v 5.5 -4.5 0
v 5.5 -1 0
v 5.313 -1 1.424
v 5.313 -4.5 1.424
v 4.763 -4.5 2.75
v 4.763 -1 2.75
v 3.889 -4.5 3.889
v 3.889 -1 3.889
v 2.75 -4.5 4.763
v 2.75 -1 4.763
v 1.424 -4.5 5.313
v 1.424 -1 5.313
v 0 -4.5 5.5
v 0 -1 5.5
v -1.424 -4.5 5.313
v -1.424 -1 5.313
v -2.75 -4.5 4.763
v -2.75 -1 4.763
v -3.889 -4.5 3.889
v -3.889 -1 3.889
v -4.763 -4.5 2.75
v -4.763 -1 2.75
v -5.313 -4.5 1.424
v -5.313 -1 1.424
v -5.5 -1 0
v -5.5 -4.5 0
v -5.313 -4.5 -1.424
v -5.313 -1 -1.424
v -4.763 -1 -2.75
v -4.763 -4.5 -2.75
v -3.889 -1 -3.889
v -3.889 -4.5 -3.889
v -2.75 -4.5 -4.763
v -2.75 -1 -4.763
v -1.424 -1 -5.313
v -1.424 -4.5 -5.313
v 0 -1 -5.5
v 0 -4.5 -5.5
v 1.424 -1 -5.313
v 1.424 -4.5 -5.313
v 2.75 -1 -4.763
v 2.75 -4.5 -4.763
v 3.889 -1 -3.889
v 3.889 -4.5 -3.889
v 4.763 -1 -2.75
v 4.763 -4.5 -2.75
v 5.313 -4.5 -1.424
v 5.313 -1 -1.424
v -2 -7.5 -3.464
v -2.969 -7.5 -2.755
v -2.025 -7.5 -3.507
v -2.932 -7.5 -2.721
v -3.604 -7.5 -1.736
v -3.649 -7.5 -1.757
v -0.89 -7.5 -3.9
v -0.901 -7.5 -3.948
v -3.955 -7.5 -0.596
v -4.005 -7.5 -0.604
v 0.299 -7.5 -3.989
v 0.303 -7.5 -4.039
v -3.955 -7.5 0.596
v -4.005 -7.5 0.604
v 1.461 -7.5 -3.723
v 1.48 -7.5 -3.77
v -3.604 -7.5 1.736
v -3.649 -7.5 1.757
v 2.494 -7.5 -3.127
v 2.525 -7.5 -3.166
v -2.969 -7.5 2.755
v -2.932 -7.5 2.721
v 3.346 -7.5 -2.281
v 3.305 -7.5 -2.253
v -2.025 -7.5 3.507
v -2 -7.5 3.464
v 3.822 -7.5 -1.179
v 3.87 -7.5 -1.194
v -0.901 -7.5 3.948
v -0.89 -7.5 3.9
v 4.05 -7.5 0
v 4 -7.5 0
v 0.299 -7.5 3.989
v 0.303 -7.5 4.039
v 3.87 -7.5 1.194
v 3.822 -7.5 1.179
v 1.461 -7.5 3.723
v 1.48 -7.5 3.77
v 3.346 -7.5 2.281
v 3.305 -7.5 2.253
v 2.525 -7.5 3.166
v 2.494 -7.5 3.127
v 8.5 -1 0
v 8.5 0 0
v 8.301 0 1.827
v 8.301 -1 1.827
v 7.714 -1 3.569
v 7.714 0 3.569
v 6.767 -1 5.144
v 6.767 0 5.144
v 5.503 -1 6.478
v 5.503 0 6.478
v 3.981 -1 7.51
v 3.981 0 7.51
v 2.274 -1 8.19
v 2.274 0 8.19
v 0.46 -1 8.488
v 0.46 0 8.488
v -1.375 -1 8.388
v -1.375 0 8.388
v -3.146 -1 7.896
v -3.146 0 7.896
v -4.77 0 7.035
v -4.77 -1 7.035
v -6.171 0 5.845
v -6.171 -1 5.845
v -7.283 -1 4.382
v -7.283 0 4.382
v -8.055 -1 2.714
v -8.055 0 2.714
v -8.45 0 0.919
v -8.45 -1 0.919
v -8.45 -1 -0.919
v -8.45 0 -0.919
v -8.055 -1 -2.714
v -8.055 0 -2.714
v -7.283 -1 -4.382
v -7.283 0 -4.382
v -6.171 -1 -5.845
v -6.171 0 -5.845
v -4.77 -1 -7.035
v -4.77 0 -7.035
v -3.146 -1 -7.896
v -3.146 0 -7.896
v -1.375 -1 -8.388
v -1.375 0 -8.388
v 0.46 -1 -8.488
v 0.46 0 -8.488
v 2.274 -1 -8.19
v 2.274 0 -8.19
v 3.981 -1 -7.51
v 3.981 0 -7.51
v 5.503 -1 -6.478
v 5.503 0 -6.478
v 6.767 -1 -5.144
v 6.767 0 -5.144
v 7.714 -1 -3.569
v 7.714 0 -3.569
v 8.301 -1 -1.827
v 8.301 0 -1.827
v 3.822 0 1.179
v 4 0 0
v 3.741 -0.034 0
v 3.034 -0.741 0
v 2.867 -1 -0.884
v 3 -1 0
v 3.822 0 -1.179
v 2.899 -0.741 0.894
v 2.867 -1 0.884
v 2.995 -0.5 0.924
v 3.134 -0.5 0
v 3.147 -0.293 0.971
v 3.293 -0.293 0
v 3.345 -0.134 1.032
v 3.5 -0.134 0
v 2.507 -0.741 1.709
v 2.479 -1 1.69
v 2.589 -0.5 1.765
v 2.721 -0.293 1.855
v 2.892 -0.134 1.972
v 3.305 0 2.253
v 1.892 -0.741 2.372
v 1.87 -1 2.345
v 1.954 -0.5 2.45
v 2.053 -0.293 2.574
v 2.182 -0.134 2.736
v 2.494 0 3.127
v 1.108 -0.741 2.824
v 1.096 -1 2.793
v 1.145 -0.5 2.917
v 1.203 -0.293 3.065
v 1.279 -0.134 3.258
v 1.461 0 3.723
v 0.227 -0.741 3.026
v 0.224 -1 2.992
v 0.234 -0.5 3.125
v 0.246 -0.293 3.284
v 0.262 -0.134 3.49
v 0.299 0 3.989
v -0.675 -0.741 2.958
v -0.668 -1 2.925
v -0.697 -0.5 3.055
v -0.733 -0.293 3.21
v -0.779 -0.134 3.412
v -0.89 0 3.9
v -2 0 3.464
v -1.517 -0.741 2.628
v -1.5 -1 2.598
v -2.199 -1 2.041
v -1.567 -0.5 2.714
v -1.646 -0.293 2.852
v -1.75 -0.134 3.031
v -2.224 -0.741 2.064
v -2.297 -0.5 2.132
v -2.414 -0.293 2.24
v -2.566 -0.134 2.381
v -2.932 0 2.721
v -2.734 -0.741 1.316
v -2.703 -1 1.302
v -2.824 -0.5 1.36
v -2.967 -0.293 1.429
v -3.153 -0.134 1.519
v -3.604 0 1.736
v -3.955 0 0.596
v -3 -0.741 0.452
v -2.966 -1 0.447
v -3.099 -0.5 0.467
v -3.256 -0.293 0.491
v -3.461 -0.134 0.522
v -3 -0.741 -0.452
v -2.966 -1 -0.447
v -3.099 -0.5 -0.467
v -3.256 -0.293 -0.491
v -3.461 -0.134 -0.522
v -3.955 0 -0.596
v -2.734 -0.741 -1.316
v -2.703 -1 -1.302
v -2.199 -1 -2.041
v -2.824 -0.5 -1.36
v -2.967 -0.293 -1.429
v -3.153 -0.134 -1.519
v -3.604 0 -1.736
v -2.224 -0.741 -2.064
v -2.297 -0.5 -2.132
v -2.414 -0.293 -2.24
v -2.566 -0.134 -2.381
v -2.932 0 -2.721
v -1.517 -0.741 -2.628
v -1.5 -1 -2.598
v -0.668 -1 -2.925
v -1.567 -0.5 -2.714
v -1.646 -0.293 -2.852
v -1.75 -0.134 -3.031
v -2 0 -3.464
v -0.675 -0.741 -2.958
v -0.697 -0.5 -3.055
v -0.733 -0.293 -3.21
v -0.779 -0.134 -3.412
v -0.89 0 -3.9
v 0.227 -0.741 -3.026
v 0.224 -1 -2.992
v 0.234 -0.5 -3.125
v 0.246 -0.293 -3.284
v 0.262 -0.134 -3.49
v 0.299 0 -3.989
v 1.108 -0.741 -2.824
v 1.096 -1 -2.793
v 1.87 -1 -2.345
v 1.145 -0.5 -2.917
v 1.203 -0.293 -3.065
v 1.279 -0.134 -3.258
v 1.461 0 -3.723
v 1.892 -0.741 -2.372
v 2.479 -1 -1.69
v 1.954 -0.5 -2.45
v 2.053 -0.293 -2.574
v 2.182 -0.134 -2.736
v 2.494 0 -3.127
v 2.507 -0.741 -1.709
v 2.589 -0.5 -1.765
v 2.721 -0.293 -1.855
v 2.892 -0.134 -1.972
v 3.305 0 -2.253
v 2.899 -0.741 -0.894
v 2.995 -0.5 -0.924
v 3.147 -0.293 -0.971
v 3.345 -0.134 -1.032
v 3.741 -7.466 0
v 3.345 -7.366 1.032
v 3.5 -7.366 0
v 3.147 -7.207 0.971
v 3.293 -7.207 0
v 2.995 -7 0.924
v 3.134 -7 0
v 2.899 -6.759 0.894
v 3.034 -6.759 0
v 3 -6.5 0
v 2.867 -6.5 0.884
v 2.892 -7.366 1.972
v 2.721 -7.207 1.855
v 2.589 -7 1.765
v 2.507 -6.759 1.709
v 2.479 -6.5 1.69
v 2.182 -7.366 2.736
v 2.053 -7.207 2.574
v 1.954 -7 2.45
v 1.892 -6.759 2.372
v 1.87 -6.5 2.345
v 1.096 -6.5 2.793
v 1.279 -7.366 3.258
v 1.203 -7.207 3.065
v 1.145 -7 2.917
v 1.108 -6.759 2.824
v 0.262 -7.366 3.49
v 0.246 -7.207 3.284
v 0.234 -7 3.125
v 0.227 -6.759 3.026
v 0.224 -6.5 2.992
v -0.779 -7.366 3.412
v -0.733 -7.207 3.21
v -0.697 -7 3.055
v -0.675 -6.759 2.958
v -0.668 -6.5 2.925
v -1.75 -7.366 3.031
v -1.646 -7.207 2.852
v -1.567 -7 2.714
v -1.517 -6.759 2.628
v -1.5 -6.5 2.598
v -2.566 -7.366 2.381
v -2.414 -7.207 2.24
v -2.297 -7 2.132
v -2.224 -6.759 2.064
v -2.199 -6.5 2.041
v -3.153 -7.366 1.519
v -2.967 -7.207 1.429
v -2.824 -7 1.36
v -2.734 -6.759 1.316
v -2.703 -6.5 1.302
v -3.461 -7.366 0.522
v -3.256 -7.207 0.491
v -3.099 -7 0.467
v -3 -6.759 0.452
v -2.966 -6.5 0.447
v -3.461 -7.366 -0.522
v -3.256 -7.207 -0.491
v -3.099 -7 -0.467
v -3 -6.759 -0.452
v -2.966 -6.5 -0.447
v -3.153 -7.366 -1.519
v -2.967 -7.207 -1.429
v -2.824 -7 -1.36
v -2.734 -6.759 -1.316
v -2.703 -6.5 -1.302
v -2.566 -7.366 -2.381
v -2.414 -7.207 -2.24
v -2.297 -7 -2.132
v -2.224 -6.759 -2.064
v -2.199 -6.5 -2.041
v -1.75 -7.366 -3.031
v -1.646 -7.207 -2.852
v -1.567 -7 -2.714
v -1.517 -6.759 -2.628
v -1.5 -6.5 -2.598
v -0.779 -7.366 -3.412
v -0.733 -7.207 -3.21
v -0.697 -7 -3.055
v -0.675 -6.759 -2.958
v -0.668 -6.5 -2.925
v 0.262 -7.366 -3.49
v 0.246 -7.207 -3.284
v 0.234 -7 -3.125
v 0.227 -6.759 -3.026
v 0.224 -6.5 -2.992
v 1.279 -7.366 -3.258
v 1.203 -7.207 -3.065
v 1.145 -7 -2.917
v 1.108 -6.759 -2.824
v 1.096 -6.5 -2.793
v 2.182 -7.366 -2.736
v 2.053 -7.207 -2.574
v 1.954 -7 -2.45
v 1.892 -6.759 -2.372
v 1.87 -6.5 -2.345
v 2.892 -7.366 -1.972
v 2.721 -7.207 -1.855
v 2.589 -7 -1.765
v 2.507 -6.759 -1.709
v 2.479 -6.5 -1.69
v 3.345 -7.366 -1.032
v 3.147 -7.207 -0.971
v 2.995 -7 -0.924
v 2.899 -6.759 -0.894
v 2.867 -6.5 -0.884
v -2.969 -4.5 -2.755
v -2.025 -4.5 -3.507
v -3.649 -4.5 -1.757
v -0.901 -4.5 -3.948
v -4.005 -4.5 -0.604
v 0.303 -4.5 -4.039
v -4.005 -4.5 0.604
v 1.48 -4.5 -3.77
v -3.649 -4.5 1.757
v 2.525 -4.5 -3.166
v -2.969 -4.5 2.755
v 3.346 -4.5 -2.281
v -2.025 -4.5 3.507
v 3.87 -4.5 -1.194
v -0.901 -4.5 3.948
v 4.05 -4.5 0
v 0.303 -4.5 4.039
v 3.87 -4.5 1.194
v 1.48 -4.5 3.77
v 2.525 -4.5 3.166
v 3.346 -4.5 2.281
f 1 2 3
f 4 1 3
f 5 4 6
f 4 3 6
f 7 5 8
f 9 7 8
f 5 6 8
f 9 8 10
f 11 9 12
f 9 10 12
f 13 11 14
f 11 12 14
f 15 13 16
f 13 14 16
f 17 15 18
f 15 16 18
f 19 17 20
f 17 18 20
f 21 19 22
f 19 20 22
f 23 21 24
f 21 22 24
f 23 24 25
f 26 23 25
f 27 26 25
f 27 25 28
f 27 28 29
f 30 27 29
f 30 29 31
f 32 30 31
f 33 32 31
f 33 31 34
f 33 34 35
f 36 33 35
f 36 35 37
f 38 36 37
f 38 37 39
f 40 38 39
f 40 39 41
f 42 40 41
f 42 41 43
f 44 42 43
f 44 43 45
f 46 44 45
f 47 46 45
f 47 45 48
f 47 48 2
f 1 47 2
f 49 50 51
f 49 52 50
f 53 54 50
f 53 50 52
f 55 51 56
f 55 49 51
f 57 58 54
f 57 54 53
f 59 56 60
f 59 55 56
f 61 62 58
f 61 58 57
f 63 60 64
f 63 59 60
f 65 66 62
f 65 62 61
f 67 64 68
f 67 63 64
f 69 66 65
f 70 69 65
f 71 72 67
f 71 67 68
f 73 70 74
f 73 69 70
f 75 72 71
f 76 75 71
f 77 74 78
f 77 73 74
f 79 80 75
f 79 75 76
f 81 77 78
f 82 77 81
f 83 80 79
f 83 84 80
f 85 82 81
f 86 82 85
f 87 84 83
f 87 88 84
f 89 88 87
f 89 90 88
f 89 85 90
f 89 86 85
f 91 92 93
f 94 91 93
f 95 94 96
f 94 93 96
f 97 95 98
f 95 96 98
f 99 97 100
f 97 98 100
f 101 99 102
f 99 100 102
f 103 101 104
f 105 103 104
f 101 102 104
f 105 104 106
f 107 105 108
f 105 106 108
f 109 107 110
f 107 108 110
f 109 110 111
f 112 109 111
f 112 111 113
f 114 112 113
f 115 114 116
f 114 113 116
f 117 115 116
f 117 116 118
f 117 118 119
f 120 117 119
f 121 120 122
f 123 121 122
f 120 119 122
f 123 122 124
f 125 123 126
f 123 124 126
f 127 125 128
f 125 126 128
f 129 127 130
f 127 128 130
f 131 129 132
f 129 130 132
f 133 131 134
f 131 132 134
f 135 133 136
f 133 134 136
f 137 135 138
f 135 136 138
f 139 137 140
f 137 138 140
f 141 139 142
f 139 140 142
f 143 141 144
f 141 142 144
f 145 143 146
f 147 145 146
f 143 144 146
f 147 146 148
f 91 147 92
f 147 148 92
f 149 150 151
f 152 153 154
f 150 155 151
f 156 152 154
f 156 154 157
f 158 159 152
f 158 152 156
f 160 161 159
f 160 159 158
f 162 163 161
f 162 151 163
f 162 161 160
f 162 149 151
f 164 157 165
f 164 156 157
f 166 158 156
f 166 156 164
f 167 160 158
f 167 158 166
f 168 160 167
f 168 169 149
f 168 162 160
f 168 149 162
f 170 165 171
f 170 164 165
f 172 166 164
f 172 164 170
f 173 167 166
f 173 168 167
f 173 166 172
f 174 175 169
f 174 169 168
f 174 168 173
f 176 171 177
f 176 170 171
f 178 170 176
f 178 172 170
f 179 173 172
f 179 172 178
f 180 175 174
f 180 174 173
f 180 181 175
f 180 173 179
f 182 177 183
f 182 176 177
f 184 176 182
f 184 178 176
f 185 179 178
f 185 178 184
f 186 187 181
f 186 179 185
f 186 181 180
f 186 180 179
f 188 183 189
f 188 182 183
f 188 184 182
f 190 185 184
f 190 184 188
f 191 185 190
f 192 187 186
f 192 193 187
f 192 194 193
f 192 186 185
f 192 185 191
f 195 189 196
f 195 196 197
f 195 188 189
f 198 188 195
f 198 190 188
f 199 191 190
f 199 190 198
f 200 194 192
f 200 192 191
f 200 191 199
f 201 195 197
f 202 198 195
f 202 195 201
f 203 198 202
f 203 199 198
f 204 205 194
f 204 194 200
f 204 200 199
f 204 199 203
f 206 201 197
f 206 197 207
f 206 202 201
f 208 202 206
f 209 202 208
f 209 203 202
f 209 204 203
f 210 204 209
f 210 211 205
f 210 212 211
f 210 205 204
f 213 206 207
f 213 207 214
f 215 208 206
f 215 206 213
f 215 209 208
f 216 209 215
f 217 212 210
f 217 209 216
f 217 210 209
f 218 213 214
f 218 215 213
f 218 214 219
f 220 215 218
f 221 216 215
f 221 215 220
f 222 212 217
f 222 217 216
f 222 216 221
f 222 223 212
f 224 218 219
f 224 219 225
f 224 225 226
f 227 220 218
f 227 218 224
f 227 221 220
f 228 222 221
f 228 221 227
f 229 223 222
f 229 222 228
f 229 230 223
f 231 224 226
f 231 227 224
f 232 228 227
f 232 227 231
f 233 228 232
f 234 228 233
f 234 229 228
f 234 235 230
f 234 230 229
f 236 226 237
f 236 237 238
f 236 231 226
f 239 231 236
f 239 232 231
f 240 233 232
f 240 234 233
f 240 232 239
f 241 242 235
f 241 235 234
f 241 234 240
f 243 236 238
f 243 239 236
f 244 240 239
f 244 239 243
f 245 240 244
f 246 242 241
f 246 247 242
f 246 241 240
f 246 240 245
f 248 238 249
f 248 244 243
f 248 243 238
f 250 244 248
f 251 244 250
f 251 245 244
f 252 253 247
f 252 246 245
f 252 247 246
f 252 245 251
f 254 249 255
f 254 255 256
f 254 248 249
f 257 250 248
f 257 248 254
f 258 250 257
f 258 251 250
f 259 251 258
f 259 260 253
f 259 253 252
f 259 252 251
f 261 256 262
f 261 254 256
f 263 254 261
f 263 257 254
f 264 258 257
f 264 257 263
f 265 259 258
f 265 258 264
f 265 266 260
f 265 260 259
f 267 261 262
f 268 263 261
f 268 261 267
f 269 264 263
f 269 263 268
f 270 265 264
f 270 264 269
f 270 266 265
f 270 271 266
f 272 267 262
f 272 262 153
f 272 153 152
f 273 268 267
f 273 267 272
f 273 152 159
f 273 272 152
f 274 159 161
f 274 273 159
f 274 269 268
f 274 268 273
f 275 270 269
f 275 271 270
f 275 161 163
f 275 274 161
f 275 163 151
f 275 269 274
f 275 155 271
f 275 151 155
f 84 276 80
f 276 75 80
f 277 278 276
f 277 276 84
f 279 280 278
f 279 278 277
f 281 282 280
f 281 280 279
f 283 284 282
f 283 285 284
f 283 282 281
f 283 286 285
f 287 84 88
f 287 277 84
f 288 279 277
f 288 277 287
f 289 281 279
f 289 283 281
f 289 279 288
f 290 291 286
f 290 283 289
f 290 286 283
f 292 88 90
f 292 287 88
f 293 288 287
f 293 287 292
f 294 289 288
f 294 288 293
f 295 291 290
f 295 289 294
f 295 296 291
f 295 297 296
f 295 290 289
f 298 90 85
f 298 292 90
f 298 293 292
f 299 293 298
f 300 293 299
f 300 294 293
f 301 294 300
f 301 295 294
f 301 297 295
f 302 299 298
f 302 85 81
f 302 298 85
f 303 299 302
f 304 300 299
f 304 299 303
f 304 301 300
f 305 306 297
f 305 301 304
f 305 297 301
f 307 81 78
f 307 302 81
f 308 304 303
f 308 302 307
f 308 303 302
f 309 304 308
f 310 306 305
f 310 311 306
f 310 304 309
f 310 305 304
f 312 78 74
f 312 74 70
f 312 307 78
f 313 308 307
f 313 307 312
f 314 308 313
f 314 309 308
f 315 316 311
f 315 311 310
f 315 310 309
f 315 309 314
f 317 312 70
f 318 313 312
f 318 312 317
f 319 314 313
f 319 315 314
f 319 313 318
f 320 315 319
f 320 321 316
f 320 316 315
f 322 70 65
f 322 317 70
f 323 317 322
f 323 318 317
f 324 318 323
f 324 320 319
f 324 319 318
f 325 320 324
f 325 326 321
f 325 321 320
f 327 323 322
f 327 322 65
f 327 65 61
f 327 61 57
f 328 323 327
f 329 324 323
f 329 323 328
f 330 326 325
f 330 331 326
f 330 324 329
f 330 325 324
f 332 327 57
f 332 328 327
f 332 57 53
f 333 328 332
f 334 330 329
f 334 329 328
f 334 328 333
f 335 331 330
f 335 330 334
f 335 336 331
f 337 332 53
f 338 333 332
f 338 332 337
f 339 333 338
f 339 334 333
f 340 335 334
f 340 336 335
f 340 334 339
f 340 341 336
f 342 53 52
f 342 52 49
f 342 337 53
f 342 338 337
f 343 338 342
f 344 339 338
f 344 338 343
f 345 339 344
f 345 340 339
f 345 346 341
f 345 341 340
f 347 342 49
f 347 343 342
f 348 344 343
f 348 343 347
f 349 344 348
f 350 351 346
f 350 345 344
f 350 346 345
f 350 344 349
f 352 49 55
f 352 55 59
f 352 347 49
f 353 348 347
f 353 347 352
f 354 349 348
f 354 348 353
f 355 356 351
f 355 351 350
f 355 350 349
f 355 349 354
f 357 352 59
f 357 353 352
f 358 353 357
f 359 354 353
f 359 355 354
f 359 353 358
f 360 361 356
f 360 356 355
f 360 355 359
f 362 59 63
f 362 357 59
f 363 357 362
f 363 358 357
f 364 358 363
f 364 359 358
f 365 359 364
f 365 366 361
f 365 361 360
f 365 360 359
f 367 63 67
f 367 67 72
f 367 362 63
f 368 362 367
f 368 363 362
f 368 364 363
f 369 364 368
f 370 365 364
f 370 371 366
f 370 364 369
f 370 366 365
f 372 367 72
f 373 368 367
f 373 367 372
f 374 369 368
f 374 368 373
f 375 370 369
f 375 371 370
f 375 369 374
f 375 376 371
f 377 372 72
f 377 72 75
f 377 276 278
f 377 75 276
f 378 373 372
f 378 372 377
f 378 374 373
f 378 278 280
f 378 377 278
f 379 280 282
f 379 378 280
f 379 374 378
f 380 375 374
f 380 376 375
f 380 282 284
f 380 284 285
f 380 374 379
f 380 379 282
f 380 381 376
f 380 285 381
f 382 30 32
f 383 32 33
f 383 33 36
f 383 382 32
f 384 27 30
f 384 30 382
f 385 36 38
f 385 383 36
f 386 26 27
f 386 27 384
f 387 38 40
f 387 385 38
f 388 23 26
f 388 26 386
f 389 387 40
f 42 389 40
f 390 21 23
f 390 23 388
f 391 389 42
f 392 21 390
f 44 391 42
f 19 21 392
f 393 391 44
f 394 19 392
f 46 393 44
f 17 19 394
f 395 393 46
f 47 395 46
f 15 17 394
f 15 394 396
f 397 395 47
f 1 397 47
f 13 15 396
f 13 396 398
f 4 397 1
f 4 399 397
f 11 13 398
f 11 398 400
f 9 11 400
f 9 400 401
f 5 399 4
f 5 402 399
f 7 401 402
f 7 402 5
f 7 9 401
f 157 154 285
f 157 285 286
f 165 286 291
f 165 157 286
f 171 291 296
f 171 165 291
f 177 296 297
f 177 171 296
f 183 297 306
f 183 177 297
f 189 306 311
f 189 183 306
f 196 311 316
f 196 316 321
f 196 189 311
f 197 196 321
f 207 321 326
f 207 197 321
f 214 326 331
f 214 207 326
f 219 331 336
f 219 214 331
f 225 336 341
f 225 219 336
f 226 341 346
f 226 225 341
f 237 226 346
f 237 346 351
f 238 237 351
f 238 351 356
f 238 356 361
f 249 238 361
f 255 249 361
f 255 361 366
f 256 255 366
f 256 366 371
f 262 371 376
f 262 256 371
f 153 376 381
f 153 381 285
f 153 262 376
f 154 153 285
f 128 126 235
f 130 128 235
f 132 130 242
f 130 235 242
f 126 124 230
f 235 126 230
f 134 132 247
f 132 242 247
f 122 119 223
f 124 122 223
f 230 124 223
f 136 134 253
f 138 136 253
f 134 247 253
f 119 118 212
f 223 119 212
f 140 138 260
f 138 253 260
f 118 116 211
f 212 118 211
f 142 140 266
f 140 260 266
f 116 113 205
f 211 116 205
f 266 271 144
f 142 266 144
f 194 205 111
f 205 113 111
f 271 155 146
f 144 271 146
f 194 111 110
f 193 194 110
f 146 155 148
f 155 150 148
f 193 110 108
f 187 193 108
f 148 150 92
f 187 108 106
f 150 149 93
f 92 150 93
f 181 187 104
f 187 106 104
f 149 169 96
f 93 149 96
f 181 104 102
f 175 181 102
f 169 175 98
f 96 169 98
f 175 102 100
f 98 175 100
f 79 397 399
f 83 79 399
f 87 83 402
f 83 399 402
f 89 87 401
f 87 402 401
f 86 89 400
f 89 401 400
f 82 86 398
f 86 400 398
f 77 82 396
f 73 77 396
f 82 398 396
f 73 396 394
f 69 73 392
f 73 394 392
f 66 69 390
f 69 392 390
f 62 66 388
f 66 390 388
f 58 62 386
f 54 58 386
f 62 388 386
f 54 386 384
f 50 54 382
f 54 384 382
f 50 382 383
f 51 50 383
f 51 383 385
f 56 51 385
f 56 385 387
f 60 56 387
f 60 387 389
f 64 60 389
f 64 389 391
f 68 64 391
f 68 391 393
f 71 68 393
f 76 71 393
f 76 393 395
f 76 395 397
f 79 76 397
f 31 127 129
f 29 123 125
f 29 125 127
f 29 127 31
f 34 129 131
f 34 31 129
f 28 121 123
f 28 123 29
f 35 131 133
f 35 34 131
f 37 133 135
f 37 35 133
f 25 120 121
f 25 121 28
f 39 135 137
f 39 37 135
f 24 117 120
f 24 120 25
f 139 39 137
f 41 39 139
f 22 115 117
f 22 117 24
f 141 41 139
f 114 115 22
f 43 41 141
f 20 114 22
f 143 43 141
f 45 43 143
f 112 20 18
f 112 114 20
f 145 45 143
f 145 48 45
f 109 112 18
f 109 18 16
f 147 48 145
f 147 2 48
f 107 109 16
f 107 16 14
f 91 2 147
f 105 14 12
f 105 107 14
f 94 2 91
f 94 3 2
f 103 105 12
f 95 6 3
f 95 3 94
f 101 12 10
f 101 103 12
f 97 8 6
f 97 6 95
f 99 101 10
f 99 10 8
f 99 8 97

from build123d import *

# Parameters (mm, degrees)
F0_R     = 8.5
F0_R_2   = 5.5
F1_DEPTH = 1
F0_R_3   = 4.05
F2_DEPTH = 4.5
F0_R_4   = 3
F3_DEPTH = 7.5
F4_R     = 1
F5_R     = 1


with BuildPart() as f1:
    # F0 (on Front) → F1 (new body)
    with BuildSketch(Plane.XZ):
        Circle(F0_R)
        Circle(F0_R_2, mode=Mode.SUBTRACT)
    extrude(amount=F1_DEPTH)

    # F0 (on Front) → F2 (join)
    with BuildSketch(Plane.XZ):
        Circle(F0_R_2)
        Circle(F0_R_3, mode=Mode.SUBTRACT)
    extrude(amount=F2_DEPTH)

    # F0 (on Front) → F3 (join)
    with BuildSketch(Plane.XZ):
        Circle(F0_R_3)
        Circle(F0_R_4, mode=Mode.SUBTRACT)
    extrude(amount=F3_DEPTH)

    # F4
    f4_edges = [f1.edges().sort_by_distance(p)[0] for p in [
        (-3, -7.5, 0),
    ]]
    fillet(f4_edges, radius=F4_R)

    # F5
    f5_edges = [f1.edges().sort_by_distance(p)[0] for p in [
        (-3, 0, 0),
    ]]
    fillet(f5_edges, radius=F5_R)


solid = f1.part
